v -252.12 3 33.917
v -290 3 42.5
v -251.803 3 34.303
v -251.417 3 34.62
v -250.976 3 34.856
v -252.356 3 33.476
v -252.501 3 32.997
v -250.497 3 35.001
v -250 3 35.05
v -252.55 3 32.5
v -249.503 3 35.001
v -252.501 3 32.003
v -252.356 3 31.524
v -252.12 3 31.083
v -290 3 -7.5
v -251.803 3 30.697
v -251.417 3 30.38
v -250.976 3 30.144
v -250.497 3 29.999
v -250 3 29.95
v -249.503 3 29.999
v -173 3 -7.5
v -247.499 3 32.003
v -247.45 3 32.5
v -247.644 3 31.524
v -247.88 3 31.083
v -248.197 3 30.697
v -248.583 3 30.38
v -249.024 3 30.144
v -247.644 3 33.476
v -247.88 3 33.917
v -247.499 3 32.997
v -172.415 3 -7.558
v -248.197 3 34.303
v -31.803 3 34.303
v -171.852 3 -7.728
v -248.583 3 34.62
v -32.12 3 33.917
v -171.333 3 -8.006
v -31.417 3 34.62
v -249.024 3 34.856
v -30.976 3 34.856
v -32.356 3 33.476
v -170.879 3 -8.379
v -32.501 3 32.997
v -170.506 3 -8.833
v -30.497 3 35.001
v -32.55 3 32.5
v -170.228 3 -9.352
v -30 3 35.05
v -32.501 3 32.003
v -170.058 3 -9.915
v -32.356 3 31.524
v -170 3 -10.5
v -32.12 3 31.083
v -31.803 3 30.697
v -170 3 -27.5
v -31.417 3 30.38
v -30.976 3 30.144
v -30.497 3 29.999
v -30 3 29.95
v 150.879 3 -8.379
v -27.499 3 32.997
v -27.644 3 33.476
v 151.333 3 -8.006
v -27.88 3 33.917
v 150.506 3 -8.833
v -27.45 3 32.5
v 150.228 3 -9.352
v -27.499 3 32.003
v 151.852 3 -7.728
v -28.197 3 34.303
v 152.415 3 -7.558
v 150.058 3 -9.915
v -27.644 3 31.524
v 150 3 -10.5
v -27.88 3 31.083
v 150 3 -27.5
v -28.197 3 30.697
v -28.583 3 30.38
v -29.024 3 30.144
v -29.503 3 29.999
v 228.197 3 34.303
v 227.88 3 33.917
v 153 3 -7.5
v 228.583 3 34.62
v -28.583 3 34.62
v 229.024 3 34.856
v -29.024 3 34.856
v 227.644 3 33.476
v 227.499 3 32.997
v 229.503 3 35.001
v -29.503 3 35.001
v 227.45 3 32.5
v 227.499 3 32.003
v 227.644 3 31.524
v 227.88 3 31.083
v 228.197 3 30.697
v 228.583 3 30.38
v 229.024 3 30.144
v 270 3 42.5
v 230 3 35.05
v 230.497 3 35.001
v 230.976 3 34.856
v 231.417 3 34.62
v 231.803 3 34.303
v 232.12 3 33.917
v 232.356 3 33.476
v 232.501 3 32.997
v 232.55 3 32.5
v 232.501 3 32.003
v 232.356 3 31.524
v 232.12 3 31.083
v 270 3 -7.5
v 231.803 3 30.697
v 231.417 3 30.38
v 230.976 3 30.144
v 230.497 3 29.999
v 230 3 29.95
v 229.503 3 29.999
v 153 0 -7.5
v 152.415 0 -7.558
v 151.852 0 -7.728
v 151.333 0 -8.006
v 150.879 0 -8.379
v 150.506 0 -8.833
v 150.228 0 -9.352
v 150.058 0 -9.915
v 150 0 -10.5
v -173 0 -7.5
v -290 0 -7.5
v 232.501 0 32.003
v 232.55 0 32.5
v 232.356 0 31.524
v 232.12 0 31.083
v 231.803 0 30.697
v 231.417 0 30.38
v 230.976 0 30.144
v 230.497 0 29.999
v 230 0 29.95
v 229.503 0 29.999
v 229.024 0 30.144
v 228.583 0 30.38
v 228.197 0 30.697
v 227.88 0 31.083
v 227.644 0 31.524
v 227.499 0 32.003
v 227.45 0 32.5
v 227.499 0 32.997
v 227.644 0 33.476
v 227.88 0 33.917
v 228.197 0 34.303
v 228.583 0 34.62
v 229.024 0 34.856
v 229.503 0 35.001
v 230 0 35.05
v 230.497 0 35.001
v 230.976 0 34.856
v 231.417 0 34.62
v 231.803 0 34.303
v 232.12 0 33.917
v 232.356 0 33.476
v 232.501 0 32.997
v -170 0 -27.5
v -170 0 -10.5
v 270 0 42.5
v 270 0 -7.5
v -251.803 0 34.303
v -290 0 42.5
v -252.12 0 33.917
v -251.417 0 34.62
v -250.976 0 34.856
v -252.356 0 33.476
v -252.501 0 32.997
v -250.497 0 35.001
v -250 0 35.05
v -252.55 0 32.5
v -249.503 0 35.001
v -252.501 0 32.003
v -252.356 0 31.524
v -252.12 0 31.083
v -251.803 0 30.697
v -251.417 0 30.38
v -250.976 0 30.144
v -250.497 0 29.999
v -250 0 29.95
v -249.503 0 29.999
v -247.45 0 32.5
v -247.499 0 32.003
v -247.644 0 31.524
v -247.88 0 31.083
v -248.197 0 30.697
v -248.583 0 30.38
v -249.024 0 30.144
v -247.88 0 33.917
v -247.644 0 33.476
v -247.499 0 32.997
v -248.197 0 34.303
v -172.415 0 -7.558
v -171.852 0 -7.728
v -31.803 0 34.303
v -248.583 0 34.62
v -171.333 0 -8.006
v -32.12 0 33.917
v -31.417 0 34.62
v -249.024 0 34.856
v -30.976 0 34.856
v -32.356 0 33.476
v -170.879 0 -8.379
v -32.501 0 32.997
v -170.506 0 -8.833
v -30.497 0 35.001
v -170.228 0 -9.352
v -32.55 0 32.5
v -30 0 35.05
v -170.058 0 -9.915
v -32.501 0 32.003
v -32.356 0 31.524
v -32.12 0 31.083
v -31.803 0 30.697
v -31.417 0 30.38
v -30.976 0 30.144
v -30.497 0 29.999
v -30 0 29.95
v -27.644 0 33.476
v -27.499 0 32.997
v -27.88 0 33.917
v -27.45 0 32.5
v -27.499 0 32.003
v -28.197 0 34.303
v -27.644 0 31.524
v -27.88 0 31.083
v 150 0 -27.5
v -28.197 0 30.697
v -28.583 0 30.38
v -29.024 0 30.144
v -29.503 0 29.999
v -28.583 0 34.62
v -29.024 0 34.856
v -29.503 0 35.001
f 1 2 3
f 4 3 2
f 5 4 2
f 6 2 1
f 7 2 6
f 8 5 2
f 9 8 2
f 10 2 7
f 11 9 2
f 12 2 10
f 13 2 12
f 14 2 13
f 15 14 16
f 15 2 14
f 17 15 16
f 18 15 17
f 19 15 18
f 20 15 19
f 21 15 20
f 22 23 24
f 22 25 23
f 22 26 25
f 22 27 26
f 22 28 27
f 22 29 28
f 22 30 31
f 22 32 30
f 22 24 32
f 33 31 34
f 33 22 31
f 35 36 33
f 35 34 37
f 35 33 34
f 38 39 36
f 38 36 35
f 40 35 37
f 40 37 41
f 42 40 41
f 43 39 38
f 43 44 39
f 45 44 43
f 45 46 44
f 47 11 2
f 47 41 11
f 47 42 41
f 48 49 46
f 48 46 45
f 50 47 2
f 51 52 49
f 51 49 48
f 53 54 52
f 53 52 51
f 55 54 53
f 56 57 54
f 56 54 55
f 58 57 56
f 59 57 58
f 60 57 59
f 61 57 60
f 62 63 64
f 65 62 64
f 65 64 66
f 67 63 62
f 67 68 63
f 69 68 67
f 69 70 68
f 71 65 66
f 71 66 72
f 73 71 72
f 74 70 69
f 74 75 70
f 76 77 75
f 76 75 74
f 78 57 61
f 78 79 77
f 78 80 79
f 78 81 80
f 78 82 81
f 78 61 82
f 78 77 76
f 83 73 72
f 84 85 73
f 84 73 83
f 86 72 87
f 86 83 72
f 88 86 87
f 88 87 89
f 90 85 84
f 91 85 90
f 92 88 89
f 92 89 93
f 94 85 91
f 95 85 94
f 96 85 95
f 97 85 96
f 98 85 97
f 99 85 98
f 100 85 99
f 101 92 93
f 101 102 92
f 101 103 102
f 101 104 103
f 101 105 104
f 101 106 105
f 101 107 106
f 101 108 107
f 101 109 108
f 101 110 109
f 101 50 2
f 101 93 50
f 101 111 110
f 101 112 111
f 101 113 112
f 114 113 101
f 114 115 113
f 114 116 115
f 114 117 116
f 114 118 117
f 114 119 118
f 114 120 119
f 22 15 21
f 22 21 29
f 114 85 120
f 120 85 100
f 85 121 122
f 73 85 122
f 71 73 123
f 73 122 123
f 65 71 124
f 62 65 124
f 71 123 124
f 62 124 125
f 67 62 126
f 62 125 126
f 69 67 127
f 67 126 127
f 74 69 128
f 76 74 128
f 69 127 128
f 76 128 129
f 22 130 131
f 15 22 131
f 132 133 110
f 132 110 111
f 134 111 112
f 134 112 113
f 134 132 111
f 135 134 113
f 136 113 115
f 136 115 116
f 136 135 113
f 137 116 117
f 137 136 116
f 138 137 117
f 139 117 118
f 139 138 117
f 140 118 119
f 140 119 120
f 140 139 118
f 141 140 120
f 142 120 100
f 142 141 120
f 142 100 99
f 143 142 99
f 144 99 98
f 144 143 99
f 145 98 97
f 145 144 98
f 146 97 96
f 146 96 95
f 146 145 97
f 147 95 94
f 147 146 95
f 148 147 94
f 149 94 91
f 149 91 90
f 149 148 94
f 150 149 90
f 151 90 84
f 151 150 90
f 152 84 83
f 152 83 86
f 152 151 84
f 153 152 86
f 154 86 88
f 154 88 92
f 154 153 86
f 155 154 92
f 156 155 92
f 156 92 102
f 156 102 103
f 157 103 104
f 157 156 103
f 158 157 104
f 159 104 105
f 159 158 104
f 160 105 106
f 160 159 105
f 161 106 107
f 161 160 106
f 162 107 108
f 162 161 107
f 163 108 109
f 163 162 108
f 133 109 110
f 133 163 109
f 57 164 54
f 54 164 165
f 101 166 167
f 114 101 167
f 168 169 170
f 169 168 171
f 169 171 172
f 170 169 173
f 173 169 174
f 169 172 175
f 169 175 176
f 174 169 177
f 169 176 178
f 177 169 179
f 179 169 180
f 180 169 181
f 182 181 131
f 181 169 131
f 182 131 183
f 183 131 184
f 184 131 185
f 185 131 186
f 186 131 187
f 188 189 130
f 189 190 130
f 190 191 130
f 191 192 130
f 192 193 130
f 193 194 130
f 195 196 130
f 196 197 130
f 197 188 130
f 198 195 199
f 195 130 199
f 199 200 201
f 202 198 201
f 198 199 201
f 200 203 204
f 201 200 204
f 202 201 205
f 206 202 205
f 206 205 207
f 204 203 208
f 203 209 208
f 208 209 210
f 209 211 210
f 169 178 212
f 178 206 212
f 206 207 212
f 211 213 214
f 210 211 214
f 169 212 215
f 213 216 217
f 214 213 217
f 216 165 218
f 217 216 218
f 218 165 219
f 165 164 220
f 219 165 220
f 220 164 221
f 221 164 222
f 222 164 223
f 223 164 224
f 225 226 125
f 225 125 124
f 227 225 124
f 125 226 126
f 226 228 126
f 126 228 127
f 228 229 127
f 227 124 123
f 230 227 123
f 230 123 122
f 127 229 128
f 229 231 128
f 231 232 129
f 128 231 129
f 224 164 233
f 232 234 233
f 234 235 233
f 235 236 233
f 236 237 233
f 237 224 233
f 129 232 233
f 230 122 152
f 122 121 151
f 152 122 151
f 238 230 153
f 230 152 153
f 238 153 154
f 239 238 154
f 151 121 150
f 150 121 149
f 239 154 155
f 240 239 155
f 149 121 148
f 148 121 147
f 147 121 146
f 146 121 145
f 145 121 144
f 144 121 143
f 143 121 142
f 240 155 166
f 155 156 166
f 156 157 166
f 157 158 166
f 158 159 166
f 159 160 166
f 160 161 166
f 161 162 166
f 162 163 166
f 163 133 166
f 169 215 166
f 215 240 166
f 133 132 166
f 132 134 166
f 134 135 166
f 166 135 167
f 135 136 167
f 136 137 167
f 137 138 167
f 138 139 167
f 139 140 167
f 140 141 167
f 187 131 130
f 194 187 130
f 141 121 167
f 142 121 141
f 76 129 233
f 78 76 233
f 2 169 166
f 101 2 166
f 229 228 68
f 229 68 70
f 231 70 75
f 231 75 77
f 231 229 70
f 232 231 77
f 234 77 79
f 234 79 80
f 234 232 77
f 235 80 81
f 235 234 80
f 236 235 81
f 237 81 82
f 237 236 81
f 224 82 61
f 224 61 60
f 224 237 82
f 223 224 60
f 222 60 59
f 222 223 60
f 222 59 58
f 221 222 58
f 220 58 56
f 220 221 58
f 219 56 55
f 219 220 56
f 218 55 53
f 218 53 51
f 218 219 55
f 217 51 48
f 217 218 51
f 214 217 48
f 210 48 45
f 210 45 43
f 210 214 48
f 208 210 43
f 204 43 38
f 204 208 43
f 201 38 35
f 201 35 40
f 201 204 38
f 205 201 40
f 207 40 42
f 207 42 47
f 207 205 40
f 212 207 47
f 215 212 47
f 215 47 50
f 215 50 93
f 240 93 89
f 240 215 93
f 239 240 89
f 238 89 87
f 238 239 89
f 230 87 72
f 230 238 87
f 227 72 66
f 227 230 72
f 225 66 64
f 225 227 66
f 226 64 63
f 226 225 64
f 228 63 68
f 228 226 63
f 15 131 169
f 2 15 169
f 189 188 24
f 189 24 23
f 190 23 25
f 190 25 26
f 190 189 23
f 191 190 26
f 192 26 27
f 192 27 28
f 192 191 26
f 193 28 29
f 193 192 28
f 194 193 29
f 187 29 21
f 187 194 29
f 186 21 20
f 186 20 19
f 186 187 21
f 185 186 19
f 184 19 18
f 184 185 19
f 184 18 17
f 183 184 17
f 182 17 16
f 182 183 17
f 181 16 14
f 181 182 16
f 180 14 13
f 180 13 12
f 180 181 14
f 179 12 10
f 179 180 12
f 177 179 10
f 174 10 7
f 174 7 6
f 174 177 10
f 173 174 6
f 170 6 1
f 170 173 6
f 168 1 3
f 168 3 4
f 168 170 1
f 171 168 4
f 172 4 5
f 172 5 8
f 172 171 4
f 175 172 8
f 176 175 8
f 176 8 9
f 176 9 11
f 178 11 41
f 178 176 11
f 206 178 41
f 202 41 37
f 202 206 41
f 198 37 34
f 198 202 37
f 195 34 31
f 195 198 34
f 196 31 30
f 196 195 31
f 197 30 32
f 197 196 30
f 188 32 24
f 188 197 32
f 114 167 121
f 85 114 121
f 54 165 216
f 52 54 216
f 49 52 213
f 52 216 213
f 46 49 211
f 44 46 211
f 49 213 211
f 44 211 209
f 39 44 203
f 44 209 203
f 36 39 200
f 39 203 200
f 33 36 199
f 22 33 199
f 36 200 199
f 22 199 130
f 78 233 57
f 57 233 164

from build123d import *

# Parameters (mm, degrees)
SKETCH1_R           = 2.55
BOSS_EXTRUDE1_DEPTH = 3


with BuildPart() as part:
    # Sketch1 → Boss-Extrude1 (new body)
    with BuildSketch(Plane(origin=(0, 0, 0), x_dir=(1, 0, 0), z_dir=(0, 1, 0))):
        with BuildLine():
            Line((-170, 27.5), (-170, 10.5))
            ThreePointArc((-170, 10.5), (-170.878679656, 8.378679656), (-173, 7.5))
            Line((-173, 7.5), (-290, 7.5))
            Line((-290, 7.5), (-290, -42.5))
            Line((-290, -42.5), (270, -42.5))
            Line((270, -42.5), (270, 7.5))
            Line((270, 7.5), (153, 7.5))
            ThreePointArc((153, 7.5), (150.878679656, 8.378679656), (150, 10.5))
            Line((150, 10.5), (150, 27.5))
            Line((150, 27.5), (-170, 27.5))
        make_face()
        with Locations((-250, -32.5)):
            Circle(SKETCH1_R, mode=Mode.SUBTRACT)
        with Locations((-30, -32.5)):
            Circle(SKETCH1_R, mode=Mode.SUBTRACT)
        with Locations((230, -32.5)):
            Circle(SKETCH1_R, mode=Mode.SUBTRACT)
    extrude(amount=BOSS_EXTRUDE1_DEPTH)


solid = part.part
